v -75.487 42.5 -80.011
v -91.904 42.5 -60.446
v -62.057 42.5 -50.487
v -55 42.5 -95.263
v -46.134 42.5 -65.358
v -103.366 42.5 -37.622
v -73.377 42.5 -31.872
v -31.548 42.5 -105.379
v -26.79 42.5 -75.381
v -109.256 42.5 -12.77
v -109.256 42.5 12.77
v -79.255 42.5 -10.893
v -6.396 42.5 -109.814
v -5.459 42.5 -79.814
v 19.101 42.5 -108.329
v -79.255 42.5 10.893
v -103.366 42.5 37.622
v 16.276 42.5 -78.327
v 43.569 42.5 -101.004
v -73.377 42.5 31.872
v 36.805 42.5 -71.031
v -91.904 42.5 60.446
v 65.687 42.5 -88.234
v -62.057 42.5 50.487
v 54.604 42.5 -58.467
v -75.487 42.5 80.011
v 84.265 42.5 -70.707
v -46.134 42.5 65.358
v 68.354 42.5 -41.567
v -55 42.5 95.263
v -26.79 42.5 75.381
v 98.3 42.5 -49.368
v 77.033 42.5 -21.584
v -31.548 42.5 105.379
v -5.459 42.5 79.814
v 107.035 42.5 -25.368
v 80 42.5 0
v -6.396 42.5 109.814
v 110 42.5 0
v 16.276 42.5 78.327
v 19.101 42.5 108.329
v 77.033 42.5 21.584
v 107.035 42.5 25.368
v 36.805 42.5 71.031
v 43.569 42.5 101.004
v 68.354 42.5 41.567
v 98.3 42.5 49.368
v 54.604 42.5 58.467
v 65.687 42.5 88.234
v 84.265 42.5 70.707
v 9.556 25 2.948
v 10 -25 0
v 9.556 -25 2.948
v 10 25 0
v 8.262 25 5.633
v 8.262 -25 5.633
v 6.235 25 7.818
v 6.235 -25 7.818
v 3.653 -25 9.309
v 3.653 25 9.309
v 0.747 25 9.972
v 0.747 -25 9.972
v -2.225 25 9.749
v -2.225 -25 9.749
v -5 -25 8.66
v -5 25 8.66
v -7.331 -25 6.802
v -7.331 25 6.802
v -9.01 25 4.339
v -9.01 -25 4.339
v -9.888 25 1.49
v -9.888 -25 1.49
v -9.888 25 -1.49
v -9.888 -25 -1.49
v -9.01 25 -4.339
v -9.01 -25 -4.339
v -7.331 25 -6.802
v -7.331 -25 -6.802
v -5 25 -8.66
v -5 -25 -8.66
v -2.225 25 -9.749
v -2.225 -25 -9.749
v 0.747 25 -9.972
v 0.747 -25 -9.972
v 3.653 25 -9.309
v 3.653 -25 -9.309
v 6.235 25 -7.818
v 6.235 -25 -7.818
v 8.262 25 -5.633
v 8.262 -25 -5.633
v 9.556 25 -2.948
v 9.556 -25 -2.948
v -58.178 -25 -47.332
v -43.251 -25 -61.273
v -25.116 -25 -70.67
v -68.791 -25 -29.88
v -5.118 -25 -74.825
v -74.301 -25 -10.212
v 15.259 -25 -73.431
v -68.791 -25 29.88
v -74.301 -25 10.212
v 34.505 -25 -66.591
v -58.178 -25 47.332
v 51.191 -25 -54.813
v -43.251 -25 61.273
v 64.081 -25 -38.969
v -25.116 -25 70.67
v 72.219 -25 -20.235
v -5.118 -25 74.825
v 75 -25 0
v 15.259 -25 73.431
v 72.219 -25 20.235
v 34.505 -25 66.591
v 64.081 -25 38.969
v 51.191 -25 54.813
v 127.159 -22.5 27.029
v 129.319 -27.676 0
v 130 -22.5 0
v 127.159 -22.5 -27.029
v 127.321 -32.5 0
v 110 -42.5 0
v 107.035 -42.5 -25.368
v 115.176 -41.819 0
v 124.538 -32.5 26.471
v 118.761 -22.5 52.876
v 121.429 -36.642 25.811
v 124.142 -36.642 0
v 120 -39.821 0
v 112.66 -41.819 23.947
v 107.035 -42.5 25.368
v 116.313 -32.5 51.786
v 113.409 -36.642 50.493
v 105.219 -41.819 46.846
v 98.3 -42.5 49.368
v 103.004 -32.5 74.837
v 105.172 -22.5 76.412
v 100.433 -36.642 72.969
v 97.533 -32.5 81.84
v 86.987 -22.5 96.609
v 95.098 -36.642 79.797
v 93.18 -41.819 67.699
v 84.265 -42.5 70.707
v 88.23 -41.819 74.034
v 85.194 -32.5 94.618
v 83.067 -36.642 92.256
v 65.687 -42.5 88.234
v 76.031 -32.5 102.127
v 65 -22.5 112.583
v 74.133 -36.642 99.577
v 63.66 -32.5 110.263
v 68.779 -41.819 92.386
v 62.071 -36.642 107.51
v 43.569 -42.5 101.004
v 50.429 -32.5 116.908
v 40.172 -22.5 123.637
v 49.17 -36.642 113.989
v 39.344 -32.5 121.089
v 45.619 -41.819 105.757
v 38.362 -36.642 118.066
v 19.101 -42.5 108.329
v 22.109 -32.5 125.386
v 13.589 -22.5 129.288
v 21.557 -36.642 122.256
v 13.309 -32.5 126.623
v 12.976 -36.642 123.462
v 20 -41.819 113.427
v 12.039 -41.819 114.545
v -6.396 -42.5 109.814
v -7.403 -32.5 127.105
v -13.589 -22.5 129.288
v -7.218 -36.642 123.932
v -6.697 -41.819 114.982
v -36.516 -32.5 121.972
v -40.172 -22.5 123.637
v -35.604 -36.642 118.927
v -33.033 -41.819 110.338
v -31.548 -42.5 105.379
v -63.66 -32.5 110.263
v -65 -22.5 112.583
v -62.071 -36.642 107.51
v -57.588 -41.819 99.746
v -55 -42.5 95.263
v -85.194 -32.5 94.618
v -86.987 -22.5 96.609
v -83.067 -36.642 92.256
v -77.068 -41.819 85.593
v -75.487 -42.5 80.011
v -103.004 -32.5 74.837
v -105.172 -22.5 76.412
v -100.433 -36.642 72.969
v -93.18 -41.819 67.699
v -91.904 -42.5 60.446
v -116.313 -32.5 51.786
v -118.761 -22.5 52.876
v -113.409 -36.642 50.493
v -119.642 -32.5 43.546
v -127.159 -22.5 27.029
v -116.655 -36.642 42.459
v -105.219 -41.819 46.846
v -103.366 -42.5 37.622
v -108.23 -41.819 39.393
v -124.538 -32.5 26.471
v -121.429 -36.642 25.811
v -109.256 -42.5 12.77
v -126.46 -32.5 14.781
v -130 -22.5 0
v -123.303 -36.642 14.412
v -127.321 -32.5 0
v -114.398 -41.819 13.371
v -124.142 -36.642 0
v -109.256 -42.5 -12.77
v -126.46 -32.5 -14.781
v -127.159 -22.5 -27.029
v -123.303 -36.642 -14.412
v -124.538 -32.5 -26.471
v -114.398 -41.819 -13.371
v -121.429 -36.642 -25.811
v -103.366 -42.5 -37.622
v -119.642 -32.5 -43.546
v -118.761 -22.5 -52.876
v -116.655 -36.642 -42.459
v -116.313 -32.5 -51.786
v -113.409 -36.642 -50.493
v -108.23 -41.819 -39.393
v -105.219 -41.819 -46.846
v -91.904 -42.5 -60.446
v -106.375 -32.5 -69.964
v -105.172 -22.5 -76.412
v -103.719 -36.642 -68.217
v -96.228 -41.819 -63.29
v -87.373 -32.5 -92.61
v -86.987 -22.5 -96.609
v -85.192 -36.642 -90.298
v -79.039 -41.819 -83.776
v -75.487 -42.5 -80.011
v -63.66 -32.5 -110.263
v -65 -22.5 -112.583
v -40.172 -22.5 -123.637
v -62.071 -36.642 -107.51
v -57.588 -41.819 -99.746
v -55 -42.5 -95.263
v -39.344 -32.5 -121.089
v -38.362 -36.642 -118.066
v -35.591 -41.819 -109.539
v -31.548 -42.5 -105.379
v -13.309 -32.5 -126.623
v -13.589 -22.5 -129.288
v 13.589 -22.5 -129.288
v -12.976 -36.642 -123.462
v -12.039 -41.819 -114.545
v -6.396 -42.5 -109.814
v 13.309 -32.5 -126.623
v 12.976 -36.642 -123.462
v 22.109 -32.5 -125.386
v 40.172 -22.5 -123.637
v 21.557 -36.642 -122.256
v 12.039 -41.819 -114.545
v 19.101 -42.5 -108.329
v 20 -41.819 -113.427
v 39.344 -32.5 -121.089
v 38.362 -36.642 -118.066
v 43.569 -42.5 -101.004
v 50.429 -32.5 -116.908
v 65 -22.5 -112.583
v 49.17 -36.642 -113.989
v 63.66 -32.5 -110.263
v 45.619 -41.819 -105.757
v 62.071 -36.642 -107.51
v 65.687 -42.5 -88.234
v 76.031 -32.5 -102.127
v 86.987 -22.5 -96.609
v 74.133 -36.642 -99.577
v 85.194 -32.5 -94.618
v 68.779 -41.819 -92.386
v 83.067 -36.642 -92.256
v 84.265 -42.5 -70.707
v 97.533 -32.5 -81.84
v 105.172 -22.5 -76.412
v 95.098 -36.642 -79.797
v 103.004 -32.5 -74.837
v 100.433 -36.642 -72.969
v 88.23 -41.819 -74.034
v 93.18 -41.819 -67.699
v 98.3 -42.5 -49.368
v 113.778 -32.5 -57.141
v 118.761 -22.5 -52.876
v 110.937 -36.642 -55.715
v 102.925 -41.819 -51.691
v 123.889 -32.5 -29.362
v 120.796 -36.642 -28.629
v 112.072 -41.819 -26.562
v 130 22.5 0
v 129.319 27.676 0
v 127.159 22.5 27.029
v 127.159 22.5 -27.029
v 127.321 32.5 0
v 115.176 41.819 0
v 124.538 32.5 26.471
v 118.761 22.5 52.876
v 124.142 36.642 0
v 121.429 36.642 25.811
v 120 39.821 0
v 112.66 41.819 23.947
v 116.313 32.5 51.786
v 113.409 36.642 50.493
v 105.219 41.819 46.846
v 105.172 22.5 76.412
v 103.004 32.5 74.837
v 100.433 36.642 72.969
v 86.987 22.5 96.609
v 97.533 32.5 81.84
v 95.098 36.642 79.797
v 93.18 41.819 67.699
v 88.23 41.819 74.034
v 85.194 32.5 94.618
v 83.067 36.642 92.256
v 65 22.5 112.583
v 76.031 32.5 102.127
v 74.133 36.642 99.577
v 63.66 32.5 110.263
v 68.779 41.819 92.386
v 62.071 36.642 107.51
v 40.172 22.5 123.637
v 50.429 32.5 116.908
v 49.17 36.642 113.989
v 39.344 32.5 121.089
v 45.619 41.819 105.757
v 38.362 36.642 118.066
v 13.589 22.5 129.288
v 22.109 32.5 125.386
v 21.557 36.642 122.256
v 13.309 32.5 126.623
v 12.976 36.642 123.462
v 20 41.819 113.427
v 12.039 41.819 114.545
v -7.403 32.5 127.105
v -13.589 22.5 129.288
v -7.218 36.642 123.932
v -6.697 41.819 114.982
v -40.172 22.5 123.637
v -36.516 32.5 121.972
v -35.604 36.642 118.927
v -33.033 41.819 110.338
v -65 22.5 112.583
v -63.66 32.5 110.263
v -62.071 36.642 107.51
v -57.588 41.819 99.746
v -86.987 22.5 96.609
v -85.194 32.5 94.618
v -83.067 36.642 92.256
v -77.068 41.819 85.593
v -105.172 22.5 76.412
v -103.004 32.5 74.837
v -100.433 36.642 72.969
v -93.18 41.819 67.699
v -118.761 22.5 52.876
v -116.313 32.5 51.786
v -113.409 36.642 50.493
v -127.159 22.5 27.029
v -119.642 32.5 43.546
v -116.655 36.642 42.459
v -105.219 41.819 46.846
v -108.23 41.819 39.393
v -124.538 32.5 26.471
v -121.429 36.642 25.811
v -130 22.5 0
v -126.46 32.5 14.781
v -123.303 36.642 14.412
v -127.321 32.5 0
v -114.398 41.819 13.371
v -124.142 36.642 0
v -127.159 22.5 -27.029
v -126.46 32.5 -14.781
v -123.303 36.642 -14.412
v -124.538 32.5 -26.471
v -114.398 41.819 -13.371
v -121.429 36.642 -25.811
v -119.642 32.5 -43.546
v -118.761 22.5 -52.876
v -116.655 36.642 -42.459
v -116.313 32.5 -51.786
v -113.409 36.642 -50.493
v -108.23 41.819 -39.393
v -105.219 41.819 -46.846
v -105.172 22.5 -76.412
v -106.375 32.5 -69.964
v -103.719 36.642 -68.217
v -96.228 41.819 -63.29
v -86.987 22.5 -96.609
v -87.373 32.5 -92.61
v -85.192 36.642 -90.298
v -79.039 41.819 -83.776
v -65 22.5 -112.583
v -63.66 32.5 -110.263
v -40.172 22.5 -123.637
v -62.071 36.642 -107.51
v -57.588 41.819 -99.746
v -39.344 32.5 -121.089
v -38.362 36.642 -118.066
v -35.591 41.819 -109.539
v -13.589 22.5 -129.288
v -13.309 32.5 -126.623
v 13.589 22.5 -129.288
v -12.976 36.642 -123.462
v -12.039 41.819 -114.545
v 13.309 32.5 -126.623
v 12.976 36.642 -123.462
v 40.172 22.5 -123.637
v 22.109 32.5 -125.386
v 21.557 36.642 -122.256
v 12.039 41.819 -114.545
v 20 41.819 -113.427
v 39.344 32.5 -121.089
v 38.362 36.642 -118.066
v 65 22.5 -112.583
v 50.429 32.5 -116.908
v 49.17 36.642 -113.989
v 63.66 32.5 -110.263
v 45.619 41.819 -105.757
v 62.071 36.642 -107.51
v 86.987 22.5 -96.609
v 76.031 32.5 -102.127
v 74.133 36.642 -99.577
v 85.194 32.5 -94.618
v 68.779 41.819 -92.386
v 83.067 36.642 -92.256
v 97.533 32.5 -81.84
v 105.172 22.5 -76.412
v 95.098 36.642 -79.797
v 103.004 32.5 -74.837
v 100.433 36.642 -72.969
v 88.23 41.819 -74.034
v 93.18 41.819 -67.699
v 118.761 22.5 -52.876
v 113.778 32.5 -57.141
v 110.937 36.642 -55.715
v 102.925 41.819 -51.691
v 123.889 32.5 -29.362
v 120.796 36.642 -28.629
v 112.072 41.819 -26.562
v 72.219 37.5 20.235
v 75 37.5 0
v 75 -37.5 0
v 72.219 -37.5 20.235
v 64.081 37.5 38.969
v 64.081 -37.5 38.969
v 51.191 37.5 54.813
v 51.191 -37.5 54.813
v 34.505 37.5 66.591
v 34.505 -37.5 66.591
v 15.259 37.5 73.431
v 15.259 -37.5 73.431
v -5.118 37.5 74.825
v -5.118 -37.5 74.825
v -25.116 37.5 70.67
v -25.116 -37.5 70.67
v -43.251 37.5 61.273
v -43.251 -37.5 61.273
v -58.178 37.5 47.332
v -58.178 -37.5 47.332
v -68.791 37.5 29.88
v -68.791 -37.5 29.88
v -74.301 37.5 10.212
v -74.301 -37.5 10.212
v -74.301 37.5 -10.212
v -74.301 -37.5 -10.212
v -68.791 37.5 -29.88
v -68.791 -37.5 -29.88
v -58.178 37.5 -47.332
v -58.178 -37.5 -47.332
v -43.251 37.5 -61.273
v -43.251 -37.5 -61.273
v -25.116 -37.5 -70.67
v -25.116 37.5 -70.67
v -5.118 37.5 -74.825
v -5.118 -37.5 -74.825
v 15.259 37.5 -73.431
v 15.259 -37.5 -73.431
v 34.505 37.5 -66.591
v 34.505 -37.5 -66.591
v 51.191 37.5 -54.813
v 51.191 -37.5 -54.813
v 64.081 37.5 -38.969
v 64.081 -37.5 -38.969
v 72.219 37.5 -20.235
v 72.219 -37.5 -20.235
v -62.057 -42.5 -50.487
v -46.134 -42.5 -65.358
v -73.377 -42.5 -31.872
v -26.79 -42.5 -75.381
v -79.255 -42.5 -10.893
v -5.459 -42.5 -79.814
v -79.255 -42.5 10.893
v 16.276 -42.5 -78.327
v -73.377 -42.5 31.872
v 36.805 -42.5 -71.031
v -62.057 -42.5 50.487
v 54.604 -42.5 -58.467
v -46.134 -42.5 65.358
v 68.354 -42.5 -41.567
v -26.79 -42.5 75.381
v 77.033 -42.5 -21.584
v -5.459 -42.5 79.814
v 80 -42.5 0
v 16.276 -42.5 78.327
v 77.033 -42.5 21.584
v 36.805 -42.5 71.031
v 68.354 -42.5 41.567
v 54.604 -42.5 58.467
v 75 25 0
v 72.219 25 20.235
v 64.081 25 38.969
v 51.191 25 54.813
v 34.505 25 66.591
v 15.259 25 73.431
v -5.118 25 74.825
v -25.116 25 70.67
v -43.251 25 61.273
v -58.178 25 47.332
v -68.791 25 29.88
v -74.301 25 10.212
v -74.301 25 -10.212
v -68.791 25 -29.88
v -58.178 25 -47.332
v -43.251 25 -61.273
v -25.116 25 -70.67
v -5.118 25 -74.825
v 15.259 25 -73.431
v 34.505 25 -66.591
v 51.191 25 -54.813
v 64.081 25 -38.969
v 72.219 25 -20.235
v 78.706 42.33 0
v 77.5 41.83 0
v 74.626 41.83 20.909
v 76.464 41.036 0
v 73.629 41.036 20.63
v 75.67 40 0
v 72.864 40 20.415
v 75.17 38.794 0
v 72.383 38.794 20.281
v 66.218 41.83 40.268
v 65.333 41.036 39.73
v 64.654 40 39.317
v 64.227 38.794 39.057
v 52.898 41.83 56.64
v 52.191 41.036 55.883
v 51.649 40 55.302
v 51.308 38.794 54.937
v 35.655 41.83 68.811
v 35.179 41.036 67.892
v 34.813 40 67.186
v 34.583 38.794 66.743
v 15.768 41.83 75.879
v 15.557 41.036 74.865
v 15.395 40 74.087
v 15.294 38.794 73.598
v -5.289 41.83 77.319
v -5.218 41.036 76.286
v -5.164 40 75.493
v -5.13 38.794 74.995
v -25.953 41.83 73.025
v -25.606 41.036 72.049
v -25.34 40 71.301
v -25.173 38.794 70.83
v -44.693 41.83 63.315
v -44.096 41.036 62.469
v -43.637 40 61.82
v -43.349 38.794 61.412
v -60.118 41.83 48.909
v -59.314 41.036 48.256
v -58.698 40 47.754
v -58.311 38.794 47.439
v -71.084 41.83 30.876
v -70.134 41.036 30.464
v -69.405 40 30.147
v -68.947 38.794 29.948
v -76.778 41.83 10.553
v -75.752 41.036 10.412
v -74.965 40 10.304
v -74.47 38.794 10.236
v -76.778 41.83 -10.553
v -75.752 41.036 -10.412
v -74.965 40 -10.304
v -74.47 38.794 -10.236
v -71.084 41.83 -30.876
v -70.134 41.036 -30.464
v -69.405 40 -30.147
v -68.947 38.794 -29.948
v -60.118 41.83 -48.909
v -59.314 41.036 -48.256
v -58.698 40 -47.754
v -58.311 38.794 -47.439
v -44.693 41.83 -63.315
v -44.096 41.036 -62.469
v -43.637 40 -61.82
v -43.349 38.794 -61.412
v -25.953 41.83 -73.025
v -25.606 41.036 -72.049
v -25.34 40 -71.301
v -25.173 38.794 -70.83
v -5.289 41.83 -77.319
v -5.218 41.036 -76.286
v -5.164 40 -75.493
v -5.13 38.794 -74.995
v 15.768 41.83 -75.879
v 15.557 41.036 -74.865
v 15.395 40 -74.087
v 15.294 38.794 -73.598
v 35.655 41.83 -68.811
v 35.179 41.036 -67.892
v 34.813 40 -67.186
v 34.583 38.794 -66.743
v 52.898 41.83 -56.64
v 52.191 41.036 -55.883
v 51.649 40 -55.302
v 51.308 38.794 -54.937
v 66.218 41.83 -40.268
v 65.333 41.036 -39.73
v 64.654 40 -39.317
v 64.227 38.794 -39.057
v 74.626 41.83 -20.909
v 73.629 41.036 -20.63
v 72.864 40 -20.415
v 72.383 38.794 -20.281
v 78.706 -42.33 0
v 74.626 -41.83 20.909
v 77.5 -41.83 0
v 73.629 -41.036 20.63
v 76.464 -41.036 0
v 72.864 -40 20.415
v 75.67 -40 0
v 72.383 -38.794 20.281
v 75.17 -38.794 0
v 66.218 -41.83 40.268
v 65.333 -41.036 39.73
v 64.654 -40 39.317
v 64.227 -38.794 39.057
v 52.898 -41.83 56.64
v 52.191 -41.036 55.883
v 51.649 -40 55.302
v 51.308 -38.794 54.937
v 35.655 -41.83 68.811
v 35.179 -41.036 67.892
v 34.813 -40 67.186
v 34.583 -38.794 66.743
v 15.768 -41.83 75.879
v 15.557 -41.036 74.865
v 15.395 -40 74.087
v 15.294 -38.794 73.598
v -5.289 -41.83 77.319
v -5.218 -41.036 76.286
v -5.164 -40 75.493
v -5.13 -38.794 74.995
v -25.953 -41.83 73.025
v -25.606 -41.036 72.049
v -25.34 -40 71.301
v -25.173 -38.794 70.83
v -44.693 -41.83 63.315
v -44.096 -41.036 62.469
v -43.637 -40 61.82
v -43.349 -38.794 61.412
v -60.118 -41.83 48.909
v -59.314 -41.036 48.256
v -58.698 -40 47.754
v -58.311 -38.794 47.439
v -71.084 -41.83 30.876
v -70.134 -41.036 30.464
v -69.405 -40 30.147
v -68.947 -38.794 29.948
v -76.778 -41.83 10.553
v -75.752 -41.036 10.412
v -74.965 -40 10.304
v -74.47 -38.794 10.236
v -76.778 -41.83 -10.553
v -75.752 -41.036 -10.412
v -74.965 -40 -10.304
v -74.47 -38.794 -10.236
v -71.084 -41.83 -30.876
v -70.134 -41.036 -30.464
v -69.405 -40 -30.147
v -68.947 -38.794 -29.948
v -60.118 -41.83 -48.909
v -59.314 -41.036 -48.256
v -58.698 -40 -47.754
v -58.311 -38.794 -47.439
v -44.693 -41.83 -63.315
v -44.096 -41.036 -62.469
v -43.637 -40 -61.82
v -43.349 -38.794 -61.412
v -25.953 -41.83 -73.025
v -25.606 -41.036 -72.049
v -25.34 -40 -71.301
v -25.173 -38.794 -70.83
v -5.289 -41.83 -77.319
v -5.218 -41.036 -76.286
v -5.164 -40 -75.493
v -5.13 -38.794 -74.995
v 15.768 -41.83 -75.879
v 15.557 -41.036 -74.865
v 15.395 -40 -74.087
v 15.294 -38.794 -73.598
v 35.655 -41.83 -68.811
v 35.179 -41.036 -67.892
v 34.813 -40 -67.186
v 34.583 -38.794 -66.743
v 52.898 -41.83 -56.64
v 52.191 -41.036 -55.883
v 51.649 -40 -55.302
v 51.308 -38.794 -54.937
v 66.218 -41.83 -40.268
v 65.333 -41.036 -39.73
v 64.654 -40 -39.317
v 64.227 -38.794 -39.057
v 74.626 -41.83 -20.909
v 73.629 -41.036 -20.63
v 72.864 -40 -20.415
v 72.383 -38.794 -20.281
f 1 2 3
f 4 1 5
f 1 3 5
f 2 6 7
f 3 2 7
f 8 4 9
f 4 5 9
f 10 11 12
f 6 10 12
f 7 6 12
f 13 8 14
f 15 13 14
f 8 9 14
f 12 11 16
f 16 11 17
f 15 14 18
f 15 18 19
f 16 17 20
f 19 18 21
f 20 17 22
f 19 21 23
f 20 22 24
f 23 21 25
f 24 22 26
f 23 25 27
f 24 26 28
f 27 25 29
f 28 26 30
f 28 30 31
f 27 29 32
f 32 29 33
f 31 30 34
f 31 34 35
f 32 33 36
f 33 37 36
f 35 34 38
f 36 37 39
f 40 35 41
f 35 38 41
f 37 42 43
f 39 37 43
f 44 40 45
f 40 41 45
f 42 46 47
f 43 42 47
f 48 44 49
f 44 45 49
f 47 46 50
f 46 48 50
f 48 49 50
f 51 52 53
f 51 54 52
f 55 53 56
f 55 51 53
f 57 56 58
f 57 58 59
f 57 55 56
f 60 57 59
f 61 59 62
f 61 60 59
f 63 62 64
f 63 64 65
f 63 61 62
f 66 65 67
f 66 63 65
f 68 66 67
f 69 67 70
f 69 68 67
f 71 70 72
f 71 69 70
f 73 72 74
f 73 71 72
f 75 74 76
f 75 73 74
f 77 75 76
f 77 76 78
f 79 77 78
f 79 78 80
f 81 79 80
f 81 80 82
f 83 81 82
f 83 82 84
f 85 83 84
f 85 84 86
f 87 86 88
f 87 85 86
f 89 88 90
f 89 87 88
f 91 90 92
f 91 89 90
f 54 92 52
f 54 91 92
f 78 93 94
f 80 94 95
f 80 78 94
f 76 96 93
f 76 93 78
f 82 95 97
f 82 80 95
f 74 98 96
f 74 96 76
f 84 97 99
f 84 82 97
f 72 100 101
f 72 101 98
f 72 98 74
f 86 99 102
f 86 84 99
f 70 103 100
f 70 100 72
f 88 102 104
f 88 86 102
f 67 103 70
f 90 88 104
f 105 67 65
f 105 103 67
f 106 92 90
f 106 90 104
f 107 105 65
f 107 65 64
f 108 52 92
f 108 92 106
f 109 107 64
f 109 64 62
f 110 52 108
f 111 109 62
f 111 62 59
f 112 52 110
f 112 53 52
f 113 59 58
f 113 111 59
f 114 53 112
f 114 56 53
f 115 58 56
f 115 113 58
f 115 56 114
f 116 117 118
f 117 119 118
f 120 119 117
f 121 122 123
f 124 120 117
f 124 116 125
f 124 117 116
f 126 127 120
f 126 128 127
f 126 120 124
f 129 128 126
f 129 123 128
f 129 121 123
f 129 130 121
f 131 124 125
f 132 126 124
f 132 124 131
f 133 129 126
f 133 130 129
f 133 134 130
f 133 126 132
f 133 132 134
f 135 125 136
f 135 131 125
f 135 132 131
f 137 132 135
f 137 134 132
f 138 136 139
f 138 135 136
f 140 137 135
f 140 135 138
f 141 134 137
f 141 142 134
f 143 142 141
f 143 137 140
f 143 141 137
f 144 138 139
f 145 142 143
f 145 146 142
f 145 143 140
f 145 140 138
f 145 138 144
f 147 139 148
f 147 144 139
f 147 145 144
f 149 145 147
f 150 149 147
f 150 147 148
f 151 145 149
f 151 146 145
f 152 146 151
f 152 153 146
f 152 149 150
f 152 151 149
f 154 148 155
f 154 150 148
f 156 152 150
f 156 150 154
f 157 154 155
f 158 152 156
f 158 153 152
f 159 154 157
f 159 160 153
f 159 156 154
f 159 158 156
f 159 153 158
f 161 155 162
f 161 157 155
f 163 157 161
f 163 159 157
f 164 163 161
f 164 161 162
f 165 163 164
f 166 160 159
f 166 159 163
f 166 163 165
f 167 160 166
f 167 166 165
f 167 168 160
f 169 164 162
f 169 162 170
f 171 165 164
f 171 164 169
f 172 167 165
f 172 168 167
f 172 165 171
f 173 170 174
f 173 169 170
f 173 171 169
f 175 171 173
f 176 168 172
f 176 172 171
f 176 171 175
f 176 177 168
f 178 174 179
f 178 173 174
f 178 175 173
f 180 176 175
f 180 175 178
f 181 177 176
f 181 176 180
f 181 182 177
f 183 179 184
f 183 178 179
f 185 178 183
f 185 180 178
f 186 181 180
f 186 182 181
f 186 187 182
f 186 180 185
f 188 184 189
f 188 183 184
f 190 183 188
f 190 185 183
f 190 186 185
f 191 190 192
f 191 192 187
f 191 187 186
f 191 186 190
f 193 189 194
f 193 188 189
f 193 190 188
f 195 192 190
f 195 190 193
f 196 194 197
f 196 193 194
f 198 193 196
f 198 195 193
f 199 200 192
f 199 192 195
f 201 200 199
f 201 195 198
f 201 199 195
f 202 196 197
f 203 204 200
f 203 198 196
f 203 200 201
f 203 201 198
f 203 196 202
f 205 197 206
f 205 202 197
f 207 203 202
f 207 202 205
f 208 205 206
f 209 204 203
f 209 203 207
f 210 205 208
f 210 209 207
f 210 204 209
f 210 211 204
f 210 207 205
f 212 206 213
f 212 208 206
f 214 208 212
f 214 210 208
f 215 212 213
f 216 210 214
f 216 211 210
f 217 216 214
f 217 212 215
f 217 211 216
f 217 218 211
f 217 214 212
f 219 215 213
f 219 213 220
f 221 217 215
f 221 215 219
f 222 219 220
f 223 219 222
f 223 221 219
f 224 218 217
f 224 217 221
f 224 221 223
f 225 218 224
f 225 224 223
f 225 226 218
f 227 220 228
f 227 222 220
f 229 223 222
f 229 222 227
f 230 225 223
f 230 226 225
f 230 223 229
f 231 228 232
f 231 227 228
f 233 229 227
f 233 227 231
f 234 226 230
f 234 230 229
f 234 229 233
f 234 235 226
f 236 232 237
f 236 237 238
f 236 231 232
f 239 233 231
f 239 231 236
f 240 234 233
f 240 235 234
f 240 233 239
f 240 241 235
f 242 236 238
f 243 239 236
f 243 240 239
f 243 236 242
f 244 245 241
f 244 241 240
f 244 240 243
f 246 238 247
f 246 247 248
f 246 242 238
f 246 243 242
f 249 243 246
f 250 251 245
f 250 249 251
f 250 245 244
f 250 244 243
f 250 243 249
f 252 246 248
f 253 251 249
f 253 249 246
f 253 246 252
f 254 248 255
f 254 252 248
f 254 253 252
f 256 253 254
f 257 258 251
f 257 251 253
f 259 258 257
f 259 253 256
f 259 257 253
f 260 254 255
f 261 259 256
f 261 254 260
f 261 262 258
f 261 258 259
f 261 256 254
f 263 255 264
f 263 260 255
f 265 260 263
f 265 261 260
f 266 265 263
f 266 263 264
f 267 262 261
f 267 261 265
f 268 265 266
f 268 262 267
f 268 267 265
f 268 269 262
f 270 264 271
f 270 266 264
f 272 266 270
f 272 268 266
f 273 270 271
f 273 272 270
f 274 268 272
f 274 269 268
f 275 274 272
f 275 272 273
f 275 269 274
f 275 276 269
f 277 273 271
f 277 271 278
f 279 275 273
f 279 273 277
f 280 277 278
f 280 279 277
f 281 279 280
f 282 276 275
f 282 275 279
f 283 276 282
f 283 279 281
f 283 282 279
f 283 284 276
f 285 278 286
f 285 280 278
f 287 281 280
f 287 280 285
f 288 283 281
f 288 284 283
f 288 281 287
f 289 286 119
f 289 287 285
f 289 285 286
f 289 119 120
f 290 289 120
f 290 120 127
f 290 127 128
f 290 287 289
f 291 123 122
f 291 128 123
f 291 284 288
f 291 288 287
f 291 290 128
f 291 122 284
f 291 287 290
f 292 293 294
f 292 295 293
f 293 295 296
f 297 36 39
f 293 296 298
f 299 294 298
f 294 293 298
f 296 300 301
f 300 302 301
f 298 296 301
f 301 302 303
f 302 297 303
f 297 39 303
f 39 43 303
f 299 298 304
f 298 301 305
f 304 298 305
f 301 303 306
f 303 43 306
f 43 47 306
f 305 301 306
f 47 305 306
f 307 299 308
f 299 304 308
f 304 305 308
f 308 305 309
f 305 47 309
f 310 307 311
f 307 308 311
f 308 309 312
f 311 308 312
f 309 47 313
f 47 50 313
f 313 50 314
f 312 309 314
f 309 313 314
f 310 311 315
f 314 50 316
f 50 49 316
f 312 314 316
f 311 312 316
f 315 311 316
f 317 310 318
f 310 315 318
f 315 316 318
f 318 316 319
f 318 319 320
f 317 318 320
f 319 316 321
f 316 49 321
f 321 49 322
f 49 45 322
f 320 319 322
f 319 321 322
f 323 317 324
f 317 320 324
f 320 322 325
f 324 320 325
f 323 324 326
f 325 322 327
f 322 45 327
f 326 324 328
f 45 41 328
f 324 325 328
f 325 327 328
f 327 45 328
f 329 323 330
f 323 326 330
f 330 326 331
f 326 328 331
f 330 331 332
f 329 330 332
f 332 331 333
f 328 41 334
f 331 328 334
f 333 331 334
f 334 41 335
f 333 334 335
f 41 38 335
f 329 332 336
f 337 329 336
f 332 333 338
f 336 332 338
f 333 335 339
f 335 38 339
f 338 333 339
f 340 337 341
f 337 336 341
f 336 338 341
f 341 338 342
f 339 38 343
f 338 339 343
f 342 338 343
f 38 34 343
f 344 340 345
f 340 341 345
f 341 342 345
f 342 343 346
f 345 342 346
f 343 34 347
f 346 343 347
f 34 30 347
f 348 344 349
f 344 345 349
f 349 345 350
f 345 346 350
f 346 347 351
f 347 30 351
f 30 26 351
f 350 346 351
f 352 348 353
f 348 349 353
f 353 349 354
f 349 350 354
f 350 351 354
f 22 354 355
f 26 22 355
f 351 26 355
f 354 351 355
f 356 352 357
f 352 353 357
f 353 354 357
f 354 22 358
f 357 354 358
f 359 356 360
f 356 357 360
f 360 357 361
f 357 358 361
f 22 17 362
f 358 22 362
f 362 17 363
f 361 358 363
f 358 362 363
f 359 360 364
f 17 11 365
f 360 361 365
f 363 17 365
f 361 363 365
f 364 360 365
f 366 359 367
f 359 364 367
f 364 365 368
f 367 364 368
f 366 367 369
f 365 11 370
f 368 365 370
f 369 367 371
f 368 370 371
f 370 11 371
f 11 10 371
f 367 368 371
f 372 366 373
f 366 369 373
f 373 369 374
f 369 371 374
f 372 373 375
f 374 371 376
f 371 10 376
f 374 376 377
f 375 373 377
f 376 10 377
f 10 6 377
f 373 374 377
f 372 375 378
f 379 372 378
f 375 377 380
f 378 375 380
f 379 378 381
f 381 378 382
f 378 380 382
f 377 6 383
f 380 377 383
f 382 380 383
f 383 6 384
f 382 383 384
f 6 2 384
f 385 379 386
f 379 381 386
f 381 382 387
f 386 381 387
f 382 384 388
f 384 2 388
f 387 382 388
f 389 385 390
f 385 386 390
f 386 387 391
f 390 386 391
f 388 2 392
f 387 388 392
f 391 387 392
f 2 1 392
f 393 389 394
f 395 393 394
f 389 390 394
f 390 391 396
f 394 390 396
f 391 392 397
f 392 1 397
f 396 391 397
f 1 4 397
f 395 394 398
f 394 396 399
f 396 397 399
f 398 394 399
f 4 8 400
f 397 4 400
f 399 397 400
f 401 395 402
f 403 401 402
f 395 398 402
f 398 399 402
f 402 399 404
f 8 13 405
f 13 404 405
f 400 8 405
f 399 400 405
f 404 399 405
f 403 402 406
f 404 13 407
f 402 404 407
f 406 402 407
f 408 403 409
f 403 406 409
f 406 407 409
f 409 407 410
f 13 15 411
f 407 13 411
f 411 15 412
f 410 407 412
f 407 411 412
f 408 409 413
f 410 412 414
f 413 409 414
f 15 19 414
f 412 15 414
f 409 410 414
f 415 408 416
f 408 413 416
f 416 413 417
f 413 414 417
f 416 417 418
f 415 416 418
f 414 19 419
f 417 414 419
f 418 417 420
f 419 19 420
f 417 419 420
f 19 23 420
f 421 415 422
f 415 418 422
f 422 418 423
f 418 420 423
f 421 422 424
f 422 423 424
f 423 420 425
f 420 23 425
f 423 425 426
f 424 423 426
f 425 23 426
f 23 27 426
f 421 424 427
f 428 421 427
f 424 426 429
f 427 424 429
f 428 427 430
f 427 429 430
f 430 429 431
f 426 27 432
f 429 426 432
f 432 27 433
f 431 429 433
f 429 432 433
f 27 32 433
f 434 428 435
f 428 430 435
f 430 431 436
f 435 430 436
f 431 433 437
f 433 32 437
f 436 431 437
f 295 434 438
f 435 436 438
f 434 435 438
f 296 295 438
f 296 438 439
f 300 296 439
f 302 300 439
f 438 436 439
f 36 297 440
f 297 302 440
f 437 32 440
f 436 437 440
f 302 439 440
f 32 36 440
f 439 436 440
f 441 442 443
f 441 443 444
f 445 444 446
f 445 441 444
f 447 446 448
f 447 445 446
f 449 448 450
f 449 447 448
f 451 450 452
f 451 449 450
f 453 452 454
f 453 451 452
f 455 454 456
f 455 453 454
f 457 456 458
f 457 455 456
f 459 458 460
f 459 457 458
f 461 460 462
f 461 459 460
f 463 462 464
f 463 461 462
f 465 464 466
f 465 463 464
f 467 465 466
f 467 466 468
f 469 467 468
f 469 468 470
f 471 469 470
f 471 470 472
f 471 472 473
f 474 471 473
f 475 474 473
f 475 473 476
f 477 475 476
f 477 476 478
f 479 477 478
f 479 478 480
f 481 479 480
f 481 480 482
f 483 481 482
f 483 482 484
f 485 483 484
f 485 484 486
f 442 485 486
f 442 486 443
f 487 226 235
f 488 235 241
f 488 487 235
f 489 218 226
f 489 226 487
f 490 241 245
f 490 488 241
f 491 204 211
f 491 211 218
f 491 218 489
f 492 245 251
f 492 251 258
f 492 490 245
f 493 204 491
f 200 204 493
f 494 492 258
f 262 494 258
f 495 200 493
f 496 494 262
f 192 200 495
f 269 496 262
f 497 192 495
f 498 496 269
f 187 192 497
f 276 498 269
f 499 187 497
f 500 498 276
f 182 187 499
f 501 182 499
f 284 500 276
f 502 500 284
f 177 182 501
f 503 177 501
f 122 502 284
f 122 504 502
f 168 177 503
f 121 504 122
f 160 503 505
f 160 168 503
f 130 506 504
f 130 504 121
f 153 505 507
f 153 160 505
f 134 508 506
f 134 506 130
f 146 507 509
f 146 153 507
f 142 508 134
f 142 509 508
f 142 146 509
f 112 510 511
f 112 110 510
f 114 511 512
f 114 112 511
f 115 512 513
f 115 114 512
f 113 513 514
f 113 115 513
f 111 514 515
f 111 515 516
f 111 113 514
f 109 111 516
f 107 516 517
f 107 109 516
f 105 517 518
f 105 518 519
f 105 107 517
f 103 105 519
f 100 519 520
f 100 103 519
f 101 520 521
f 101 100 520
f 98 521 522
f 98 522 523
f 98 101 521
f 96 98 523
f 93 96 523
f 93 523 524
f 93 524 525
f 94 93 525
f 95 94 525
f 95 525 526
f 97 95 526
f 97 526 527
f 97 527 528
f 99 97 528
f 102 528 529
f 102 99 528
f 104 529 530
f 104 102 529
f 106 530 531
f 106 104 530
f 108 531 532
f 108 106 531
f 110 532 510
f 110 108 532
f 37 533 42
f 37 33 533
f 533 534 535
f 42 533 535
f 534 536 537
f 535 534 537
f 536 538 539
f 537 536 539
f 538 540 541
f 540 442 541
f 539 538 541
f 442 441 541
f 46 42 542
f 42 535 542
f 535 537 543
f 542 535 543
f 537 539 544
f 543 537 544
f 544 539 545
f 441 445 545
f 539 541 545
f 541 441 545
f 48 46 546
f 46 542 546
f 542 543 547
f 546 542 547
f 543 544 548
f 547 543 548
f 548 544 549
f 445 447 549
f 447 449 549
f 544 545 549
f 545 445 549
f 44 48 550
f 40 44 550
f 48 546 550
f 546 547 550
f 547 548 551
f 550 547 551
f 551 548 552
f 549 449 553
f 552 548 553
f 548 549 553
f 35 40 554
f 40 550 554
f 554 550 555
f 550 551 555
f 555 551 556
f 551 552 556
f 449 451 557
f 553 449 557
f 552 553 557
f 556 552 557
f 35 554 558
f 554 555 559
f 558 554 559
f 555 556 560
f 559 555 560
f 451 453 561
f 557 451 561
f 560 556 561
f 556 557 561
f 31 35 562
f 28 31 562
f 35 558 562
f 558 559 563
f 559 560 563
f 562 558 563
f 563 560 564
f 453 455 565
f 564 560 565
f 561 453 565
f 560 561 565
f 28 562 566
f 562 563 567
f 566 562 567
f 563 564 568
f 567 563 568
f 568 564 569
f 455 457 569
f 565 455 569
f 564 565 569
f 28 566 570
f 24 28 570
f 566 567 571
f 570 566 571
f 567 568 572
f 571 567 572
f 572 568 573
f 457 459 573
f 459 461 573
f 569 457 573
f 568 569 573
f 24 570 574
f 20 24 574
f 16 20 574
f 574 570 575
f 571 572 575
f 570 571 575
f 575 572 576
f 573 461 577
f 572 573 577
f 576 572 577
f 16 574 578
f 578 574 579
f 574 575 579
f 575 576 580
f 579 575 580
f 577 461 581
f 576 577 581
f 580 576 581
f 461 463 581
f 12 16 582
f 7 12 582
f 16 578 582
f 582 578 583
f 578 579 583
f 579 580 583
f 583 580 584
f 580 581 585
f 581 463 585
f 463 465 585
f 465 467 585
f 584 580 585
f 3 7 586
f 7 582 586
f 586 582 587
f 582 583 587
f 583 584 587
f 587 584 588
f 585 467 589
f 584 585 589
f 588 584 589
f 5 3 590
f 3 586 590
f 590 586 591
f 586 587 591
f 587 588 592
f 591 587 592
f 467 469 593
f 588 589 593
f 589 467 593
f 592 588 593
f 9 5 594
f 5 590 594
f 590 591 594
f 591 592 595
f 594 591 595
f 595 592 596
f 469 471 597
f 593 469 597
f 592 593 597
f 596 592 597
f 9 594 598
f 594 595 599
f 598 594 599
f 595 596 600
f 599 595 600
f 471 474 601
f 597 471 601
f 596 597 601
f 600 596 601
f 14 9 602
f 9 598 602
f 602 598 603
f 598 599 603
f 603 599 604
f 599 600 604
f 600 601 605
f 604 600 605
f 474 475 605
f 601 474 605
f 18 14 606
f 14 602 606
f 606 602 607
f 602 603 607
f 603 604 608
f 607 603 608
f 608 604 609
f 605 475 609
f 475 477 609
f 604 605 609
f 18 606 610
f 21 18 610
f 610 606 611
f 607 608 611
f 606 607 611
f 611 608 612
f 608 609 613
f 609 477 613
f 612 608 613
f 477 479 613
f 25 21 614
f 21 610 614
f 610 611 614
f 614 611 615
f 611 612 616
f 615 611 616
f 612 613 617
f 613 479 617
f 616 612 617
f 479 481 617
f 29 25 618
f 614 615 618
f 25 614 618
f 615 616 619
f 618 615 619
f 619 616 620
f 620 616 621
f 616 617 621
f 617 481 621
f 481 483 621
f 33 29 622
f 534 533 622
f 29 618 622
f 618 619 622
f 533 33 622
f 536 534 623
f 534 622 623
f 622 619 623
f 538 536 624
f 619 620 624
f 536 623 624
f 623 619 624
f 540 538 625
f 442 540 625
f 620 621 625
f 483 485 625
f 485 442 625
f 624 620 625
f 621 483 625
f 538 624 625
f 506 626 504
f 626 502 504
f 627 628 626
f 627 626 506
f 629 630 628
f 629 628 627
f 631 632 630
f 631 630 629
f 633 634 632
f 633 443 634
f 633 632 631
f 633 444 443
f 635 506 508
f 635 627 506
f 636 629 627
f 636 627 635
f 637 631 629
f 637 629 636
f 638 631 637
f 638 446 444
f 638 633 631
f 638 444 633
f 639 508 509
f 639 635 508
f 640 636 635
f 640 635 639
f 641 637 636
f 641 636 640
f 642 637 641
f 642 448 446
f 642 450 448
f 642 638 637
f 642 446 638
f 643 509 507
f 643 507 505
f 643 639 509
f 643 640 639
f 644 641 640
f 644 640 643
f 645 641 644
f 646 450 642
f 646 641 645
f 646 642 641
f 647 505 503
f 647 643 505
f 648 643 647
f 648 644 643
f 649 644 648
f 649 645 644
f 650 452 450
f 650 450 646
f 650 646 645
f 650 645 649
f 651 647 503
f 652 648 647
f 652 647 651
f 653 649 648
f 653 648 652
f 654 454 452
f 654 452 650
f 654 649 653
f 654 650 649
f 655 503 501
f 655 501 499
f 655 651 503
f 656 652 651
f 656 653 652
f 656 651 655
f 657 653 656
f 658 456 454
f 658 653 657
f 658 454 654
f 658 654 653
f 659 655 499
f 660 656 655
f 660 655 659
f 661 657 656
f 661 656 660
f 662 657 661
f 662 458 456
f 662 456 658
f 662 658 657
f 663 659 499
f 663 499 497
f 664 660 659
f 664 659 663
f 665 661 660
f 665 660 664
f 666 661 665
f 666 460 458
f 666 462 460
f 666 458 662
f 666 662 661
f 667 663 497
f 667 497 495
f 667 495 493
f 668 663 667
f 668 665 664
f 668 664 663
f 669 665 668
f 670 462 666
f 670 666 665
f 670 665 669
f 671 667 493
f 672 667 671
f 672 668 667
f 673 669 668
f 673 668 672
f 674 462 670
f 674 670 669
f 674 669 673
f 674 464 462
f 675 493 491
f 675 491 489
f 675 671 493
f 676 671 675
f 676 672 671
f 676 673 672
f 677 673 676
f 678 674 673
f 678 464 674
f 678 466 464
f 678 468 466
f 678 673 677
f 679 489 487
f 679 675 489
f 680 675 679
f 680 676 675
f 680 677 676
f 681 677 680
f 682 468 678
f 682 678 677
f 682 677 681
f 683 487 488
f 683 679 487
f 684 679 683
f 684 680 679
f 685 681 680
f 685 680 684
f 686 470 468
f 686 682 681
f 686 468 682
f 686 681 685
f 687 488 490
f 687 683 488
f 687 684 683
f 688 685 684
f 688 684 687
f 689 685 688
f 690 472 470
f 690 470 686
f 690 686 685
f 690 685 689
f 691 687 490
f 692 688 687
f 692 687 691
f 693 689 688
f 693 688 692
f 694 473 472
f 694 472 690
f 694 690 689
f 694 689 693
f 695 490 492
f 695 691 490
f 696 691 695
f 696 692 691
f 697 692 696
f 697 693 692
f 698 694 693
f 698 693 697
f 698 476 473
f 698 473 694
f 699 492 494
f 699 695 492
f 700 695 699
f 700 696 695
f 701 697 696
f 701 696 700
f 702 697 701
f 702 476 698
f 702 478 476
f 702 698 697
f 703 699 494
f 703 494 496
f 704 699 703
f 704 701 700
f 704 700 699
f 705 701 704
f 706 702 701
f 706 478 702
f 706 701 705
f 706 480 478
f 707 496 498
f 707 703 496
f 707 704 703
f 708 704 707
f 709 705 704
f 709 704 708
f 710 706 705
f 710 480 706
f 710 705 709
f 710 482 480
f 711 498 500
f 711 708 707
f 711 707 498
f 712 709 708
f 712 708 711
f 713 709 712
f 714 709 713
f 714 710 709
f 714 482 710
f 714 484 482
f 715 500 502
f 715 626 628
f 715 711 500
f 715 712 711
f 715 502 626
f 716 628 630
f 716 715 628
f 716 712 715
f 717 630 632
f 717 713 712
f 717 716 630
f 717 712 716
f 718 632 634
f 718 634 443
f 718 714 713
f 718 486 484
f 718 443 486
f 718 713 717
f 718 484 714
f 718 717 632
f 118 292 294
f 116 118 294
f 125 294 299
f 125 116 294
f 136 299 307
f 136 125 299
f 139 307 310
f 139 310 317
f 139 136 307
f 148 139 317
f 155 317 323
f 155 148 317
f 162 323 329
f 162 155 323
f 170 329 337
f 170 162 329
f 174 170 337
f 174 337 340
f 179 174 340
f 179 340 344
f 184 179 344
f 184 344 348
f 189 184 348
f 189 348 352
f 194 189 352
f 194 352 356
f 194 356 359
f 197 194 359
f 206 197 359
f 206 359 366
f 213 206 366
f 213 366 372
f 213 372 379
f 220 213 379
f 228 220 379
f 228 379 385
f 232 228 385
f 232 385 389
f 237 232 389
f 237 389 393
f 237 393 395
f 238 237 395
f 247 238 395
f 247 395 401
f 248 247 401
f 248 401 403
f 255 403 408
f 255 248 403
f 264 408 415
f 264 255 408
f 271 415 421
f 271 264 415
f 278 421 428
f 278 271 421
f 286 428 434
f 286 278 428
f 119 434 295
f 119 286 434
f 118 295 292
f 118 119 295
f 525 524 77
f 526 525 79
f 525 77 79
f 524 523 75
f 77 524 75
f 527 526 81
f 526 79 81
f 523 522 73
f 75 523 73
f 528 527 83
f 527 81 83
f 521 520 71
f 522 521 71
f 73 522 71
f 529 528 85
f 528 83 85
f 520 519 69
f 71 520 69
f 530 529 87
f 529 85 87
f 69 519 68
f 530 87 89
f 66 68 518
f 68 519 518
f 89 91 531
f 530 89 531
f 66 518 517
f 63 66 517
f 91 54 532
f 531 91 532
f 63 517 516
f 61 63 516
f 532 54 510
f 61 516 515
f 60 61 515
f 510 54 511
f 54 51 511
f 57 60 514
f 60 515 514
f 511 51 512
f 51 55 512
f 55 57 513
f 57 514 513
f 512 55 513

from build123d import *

# Parameters (mm, degrees)
F0_R     = 75
F0_R_2   = 10
F1_DEPTH = 25
F0_R_3   = 130
F2_DEPTH = 42.5
F3_R     = 20
F4_R     = 5


with BuildPart() as f1:
    # F0 (on Front) → F1 (new body, symmetric)
    with BuildSketch(Plane.XZ):
        Circle(F0_R)
        Circle(F0_R_2, mode=Mode.SUBTRACT)
    extrude(amount=F1_DEPTH, both=True)


with BuildPart() as f2:
    # F0 (on Front) → F2 (new body, symmetric)
    with BuildSketch(Plane.XZ):
        Circle(F0_R_3)
        Circle(F0_R, mode=Mode.SUBTRACT)
    extrude(amount=F2_DEPTH, both=True)

    # F3
    f3_edges = [f2.edges().sort_by_distance(p)[0] for p in [
        (-130, -42.5, 0),
        (-130, 42.5, 0),
    ]]
    fillet(f3_edges, radius=F3_R)

    # F4
    f4_edges = [f2.edges().sort_by_distance(p)[0] for p in [
        (-75, -42.5, 0),
        (-75, 42.5, 0),
    ]]
    fillet(f4_edges, radius=F4_R)


solid = Compound([f1.part, f2.part])
